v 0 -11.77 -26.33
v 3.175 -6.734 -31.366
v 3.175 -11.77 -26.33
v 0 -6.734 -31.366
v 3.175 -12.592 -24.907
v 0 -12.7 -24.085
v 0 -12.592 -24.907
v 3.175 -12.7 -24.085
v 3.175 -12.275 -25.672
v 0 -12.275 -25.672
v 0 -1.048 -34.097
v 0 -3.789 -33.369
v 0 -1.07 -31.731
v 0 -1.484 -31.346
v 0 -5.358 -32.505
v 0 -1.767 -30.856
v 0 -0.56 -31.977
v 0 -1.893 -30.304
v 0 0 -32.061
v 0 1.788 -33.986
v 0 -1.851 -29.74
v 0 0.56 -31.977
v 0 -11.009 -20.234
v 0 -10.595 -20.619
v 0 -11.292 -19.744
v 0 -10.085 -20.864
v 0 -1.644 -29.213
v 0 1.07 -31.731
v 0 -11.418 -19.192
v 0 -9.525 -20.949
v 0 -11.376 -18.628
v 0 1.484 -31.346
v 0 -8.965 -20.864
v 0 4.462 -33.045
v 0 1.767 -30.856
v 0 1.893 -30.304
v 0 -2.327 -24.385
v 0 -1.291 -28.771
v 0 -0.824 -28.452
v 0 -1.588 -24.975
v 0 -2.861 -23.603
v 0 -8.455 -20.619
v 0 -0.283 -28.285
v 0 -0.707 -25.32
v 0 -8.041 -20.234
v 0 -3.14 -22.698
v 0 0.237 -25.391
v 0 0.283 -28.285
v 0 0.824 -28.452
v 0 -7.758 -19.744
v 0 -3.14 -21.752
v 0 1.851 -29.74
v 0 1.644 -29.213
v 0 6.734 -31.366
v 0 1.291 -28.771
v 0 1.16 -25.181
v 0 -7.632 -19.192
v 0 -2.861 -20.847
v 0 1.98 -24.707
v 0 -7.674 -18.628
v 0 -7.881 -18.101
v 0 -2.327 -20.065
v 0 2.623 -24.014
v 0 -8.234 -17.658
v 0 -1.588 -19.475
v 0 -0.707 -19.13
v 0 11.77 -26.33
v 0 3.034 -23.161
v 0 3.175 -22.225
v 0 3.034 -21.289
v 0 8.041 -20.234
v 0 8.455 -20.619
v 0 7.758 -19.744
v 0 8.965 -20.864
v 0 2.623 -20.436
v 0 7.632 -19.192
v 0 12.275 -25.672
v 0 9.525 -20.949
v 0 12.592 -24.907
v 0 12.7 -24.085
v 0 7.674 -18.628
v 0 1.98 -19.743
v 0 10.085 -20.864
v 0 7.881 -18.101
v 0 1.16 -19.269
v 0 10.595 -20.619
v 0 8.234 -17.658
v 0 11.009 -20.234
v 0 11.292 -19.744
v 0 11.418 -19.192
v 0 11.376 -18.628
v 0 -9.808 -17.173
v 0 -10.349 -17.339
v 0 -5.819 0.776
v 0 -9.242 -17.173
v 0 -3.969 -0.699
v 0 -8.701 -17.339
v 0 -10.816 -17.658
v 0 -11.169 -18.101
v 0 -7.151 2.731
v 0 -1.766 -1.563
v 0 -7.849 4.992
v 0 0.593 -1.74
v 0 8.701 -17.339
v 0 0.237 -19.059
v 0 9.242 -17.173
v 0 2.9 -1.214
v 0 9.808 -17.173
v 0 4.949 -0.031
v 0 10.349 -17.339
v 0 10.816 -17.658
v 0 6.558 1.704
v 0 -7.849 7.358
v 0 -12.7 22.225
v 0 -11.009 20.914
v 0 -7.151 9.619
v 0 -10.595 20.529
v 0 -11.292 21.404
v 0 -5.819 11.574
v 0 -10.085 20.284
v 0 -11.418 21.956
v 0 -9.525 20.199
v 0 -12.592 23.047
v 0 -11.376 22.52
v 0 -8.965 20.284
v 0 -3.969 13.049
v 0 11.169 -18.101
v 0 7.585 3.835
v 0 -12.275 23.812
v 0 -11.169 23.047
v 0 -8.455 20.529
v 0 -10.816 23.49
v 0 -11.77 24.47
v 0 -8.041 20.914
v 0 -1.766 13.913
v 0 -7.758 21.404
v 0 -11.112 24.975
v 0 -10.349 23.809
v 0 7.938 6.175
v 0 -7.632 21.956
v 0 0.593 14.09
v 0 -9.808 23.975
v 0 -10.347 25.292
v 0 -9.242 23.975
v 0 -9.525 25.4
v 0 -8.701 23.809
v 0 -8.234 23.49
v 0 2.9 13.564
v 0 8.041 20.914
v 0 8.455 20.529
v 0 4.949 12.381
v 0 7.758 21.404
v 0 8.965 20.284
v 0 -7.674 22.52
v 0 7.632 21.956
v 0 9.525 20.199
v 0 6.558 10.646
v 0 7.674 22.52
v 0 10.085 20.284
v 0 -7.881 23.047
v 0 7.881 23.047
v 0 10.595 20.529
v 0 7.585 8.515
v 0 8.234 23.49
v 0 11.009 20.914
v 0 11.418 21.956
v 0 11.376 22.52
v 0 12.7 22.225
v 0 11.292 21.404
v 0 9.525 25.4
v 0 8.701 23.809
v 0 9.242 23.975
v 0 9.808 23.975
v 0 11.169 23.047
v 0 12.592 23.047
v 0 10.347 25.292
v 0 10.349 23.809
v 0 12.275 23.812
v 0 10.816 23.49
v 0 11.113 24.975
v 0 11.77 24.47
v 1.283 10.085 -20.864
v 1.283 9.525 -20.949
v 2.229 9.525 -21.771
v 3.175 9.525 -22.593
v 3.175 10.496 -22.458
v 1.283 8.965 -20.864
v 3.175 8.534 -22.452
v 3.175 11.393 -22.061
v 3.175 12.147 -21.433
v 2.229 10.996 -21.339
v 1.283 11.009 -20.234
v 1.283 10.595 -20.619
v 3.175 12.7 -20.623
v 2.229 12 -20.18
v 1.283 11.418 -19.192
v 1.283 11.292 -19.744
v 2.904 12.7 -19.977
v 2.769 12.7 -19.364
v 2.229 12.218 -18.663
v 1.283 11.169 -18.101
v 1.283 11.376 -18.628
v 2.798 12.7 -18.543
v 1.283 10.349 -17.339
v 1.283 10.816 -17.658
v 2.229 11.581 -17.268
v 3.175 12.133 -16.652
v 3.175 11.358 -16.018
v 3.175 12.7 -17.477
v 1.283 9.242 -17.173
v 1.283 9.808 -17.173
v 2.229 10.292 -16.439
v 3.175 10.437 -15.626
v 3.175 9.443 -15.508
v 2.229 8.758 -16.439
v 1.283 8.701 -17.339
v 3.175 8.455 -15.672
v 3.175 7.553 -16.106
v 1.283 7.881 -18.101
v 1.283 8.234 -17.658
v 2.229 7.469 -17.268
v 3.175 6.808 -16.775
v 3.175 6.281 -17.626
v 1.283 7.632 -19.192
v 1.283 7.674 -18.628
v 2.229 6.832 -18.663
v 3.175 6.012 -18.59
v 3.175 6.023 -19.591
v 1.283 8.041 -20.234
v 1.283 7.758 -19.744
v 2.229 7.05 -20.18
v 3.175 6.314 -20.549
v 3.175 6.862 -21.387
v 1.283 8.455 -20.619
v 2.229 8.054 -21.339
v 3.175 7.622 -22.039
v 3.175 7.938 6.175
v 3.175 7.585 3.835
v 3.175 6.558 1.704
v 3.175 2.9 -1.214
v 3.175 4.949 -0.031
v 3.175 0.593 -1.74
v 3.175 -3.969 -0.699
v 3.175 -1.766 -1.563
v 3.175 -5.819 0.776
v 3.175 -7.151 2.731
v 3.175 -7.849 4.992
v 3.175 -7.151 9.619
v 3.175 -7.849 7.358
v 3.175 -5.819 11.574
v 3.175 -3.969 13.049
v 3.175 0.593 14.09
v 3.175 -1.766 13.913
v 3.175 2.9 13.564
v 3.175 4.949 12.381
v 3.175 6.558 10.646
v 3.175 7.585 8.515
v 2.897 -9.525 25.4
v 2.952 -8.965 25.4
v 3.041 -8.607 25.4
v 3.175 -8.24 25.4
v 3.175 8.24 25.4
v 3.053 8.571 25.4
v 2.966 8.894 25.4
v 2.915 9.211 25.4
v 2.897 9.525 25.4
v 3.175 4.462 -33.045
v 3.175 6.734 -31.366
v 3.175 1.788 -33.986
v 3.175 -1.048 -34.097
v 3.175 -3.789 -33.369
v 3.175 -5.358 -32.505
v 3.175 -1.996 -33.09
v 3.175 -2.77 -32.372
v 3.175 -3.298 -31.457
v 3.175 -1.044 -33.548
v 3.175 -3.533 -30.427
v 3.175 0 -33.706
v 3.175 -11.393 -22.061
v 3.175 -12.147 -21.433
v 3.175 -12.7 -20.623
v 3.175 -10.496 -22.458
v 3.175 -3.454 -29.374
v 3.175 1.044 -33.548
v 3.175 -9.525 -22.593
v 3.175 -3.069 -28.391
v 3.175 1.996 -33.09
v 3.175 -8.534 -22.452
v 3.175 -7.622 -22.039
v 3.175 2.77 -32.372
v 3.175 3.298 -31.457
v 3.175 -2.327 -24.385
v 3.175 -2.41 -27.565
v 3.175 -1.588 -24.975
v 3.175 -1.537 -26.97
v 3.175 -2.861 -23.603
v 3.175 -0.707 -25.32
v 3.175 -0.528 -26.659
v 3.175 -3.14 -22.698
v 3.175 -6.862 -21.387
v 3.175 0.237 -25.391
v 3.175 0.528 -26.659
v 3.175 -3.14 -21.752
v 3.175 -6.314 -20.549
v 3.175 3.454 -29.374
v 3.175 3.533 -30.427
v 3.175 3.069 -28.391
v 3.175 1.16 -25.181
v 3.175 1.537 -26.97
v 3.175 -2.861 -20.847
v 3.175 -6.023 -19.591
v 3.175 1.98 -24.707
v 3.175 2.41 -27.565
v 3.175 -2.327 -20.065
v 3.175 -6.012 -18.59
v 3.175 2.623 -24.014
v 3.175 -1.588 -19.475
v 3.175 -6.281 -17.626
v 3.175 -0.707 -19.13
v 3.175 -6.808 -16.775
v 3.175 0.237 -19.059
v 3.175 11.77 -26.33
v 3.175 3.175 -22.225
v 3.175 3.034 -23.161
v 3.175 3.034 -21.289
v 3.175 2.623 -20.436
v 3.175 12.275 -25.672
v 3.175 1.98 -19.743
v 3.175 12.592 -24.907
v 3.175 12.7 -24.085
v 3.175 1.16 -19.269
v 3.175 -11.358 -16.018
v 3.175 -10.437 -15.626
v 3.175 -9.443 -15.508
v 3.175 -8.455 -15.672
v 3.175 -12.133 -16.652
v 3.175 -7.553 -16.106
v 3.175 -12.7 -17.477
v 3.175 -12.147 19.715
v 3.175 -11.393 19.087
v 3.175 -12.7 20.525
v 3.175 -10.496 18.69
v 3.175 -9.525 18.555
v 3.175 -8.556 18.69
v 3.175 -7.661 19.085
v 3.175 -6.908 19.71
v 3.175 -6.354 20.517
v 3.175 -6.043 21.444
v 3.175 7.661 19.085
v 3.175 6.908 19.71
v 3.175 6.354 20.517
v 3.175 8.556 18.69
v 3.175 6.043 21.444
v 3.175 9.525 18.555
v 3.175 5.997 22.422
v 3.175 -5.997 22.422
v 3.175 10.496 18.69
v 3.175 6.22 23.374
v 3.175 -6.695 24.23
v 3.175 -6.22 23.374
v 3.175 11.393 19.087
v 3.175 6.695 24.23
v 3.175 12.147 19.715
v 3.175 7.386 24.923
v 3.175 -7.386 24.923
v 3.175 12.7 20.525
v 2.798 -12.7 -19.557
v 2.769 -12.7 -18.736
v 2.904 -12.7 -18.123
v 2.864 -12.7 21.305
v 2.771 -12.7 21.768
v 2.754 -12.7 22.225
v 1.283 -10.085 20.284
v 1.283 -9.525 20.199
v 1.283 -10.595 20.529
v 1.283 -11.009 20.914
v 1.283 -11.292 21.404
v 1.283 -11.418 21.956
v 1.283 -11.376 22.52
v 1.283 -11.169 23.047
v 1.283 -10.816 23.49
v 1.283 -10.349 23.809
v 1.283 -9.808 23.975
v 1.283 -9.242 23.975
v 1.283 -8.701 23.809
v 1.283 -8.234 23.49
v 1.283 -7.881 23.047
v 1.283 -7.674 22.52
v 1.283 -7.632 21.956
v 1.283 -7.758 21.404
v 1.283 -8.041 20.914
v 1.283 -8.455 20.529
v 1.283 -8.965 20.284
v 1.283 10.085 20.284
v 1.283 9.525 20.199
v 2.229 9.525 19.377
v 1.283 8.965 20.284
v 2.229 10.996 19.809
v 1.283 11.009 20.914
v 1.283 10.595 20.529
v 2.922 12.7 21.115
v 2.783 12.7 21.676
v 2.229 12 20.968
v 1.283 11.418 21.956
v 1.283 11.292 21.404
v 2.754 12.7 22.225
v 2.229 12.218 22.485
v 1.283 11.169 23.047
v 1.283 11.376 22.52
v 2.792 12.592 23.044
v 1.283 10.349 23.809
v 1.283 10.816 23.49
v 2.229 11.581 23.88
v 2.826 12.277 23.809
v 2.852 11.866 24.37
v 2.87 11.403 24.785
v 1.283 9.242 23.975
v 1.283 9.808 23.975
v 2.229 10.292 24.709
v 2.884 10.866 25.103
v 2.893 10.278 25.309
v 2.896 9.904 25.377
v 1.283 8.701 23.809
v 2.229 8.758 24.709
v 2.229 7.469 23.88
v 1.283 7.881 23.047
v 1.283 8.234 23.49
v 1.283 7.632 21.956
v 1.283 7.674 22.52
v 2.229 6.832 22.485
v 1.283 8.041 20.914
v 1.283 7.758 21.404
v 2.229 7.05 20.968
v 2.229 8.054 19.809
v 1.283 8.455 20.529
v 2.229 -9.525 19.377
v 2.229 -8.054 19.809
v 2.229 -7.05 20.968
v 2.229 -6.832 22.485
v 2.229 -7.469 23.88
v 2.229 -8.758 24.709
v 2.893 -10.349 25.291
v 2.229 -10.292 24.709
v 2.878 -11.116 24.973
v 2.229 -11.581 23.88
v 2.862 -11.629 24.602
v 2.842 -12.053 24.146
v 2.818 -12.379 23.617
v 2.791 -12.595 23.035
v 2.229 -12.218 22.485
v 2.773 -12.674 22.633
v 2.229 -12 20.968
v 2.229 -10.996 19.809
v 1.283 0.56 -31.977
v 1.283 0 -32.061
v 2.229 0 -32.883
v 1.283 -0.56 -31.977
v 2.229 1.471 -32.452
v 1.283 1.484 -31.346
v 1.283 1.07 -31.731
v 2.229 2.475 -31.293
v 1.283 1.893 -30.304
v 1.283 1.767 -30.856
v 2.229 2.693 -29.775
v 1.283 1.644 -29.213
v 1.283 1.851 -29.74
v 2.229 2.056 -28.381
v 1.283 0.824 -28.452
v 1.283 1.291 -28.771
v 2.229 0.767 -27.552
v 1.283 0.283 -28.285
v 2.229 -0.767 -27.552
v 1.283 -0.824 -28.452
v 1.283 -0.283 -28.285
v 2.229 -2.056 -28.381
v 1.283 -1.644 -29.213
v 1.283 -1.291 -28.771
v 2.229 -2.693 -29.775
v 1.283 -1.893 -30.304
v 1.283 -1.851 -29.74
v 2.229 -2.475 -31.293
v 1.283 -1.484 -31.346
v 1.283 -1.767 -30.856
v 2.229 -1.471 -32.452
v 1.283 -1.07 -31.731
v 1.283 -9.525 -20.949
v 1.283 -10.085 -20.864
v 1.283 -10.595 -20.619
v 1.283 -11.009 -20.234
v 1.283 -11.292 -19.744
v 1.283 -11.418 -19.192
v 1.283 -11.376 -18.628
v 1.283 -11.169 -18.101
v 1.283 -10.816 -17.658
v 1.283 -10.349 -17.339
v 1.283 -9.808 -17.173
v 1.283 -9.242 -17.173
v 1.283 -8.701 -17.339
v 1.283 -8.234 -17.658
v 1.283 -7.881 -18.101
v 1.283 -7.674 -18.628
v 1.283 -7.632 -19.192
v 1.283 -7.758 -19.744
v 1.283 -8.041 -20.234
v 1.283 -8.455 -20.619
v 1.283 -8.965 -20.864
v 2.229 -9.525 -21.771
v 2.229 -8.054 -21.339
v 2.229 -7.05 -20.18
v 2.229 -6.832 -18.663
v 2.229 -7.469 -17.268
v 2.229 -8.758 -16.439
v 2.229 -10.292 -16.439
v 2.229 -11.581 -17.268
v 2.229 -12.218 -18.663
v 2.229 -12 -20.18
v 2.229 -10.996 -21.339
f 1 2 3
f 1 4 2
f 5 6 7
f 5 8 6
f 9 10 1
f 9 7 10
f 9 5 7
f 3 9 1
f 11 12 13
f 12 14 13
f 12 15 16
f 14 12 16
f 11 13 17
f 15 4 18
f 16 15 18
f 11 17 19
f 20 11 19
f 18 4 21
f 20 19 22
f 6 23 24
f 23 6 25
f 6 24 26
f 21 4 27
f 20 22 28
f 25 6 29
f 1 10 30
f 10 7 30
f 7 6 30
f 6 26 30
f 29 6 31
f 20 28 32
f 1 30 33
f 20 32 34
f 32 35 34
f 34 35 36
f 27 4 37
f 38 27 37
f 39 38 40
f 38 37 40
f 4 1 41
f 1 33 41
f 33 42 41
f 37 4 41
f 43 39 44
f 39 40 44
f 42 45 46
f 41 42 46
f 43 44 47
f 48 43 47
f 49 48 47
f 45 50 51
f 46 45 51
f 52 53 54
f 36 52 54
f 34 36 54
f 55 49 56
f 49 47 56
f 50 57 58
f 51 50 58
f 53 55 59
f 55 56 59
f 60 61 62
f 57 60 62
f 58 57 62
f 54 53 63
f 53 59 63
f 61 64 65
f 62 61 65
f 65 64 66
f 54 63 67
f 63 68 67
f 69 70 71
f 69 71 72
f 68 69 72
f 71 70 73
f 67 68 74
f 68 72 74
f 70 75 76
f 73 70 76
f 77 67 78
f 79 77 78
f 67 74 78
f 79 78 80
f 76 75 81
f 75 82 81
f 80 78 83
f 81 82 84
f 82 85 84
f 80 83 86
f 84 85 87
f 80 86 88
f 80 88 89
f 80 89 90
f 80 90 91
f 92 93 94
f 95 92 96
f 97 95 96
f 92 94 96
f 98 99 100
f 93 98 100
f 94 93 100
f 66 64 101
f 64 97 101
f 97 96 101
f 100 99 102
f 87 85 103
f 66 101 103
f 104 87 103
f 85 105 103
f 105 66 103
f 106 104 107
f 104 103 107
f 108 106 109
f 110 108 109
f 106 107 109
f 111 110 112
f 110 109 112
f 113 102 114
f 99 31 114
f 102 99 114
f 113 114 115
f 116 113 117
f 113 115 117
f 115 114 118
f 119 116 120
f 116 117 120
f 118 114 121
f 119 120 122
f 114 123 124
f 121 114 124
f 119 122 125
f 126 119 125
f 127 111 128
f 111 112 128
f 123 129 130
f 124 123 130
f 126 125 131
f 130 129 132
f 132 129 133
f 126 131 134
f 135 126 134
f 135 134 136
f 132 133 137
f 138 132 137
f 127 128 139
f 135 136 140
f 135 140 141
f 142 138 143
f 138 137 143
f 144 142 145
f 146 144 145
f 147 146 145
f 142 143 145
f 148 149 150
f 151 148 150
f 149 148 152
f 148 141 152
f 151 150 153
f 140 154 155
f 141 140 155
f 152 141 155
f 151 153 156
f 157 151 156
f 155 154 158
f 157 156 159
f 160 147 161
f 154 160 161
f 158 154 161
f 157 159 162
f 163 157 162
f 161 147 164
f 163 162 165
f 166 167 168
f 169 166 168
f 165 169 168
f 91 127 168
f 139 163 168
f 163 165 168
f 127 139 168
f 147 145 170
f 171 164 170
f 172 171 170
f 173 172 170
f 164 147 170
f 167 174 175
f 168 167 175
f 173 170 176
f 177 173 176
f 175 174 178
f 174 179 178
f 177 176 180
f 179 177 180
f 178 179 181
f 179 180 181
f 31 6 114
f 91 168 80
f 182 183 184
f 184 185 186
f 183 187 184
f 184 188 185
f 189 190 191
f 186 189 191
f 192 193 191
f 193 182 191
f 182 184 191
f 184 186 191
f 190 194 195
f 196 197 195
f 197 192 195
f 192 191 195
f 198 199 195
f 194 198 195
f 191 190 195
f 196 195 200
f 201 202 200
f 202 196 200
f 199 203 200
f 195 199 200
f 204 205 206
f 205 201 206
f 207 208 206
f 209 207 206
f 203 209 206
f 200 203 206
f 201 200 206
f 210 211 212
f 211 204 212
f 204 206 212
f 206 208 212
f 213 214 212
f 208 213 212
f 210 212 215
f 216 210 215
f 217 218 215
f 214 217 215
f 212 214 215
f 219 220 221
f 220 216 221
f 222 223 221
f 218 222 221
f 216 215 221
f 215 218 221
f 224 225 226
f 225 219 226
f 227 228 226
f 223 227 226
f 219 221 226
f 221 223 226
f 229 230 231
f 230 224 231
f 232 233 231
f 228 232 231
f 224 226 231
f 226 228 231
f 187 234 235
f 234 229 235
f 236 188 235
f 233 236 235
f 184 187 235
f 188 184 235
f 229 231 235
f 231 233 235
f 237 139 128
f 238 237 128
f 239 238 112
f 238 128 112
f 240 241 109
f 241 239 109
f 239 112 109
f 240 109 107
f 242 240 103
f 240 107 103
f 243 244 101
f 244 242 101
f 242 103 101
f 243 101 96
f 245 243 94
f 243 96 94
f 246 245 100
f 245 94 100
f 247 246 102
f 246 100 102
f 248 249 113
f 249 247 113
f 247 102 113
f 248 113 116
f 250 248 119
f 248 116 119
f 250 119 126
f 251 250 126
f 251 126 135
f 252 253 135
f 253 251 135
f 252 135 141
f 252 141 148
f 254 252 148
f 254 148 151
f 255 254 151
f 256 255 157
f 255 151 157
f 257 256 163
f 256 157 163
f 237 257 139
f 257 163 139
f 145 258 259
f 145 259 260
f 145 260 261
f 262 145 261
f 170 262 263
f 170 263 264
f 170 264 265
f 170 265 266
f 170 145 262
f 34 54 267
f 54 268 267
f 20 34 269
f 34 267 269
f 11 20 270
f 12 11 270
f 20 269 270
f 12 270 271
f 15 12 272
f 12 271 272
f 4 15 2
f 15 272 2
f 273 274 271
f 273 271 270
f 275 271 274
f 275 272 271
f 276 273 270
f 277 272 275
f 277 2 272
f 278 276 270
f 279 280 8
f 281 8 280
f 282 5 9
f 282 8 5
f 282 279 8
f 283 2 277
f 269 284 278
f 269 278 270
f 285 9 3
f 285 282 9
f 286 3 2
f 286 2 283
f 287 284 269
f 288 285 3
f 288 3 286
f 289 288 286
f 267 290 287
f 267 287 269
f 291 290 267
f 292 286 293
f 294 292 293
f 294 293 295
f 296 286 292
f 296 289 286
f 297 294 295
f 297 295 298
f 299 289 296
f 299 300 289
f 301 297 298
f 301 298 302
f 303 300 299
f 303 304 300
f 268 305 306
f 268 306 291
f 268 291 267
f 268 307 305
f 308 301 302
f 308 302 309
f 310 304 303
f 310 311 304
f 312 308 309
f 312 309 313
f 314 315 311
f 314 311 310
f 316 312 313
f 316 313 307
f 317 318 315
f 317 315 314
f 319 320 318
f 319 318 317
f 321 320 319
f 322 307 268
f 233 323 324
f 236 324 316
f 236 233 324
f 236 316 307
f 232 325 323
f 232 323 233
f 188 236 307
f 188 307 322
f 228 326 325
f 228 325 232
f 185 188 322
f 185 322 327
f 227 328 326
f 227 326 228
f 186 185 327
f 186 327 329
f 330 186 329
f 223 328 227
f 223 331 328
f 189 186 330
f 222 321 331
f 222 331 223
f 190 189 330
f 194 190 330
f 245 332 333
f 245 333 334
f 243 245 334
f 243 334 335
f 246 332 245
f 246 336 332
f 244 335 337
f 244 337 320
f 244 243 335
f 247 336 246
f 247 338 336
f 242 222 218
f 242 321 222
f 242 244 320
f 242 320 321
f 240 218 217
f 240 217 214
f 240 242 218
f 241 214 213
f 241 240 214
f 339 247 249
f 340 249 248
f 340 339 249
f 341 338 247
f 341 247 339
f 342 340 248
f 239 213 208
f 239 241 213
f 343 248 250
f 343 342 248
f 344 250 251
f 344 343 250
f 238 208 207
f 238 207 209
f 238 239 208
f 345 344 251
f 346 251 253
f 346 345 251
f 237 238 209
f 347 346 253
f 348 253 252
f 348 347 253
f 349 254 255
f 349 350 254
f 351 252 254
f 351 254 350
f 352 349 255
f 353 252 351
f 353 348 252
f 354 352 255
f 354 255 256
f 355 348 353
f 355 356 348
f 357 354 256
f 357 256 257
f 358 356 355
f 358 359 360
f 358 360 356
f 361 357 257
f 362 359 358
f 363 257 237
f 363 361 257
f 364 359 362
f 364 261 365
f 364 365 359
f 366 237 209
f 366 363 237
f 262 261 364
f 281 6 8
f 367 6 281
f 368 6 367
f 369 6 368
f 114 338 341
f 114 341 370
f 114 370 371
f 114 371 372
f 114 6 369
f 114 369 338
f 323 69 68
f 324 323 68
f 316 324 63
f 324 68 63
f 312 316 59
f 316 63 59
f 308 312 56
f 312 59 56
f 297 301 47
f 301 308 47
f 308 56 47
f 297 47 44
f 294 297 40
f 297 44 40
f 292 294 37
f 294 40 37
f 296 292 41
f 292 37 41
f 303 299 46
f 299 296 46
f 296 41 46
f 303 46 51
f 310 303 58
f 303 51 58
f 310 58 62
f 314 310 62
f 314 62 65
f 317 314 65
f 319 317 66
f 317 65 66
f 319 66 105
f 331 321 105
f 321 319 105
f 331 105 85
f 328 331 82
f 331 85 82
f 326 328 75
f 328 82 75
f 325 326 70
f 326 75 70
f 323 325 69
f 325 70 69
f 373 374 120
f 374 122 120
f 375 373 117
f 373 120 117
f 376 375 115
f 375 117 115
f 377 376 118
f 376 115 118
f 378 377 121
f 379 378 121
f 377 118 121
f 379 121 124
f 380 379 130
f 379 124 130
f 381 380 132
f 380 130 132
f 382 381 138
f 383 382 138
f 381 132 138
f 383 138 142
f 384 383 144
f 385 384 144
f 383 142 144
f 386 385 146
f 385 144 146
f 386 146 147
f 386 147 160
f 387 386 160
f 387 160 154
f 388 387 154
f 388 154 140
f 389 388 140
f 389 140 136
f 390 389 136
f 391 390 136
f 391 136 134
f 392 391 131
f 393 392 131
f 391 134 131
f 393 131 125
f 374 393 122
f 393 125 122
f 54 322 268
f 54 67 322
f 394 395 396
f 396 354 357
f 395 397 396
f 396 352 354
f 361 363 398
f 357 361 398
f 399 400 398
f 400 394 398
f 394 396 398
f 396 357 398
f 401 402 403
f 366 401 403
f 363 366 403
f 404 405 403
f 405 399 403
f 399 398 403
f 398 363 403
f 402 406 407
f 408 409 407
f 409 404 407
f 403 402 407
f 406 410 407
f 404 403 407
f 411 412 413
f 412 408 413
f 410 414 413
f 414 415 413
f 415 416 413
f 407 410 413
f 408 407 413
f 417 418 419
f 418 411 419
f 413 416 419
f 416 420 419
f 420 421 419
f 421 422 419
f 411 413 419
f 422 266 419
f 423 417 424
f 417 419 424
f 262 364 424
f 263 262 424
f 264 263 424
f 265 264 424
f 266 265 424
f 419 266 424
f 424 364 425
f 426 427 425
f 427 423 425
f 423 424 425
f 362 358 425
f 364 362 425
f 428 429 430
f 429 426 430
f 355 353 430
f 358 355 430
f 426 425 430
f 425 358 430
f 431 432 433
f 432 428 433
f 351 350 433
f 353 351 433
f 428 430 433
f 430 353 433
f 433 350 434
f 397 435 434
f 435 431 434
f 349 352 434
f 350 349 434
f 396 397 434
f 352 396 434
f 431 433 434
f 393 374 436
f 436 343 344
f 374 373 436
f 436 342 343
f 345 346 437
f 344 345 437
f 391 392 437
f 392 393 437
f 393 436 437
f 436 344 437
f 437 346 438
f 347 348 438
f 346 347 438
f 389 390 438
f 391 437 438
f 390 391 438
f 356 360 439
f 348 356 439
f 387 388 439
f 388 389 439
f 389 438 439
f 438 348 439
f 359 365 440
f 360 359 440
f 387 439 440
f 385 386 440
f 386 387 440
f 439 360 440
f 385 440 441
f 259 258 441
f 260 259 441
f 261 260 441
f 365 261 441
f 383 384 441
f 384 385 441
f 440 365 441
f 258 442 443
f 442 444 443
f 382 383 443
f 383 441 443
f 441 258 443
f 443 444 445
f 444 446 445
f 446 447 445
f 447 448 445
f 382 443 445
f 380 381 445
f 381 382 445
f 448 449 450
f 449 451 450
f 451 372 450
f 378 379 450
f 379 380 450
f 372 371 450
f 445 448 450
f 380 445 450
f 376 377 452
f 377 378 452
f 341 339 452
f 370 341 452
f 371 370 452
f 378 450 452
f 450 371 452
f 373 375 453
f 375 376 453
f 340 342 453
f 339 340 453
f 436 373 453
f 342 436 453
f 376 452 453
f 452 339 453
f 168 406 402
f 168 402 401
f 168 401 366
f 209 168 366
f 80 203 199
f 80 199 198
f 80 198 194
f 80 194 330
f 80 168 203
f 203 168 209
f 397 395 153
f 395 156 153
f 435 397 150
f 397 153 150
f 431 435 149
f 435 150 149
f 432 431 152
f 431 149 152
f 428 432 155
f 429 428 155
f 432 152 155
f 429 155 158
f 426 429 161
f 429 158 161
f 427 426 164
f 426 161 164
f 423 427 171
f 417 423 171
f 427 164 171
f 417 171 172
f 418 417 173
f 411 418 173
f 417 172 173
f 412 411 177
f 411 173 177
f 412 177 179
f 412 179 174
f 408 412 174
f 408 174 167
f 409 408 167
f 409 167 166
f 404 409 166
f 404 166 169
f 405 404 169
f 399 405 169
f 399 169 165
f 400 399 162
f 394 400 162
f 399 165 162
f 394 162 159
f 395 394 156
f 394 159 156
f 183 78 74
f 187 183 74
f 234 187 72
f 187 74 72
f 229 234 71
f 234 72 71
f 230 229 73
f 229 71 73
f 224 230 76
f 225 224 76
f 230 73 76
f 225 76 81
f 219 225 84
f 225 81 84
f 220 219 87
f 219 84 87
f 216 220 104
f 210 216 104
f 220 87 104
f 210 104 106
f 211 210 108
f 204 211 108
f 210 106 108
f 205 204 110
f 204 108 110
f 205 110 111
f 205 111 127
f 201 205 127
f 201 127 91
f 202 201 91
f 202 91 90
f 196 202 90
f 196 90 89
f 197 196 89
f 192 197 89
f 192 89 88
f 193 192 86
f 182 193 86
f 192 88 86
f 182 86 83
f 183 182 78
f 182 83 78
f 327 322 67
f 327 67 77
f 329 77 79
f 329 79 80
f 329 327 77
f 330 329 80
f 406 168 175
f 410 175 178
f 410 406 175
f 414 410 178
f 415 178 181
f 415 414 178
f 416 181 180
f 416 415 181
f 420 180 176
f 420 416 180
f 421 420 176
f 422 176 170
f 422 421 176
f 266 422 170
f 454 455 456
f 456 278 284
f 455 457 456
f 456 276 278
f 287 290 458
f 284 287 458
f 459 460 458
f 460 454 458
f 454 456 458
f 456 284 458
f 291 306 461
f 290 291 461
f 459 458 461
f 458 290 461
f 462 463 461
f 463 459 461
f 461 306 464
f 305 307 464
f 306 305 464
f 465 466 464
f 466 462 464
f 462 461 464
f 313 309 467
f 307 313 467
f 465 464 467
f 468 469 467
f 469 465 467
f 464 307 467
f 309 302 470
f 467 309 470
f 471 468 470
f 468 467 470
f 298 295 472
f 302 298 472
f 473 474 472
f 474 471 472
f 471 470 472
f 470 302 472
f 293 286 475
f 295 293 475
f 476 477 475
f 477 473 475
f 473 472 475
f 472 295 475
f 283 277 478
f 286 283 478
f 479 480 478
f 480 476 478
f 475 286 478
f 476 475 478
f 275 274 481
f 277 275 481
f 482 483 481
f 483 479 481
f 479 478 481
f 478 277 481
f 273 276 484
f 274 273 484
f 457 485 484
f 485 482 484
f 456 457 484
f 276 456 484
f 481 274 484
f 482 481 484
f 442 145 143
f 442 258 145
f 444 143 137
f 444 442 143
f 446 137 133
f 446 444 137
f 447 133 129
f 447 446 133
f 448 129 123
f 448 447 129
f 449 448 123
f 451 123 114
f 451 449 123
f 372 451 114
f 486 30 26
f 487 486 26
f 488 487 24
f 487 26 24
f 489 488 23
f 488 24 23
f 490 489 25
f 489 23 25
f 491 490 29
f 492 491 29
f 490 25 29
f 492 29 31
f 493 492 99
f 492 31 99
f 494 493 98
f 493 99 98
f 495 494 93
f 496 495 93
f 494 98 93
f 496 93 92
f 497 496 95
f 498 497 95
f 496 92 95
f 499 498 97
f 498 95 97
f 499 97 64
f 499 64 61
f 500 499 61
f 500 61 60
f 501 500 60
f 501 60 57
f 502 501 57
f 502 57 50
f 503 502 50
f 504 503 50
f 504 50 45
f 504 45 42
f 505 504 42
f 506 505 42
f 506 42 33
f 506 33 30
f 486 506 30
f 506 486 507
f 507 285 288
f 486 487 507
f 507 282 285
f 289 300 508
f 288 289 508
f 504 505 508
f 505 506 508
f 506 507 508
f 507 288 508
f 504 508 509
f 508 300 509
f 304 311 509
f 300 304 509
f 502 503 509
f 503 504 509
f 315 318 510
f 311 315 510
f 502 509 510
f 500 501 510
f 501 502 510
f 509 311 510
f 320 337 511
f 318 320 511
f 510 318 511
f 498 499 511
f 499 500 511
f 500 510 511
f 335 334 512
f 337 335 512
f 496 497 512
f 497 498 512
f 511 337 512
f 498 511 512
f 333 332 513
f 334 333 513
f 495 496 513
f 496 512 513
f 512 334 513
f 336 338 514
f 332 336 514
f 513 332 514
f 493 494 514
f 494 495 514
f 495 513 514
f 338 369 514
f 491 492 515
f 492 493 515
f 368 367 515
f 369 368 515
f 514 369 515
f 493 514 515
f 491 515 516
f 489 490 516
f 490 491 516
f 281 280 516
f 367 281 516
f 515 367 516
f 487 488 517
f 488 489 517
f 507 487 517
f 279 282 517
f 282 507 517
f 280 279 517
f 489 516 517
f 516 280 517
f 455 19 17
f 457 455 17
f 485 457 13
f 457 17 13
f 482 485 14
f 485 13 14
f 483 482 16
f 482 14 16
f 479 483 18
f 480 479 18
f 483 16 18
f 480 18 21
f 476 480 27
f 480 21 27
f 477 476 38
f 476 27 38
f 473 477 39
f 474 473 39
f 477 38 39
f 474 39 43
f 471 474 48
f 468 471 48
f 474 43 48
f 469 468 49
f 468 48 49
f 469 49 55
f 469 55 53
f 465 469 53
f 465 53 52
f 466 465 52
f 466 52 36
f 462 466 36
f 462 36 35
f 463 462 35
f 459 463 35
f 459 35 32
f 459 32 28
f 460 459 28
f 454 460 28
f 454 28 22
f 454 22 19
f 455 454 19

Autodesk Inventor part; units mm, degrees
ref_plane "YZ Plane" through (0, 0, 0) normal (1, 0, 0) x (0, 1, 0)
ref_plane "XZ Plane" through (0, 0, 0) normal (0, 1, 0) x (-1, 0, 0)
ref_plane "XY Plane" through (0, 0, 0) normal (0, 0, 1) x (1, 0, 0)
sketch "Sketch1" plane through (0, 0, 0) normal (1, 0, 0) x (0, 1, 0)
  line L0 (-12.7, 25.4) -> (12.7, 25.4)
  line L1 (12.7, 25.4) -> (12.7, -25.4)
  line L2 (12.7, -25.4) -> (-12.7, -25.4) construction
  line L3 (-12.7, -25.4) -> (-12.7, 25.4)
  line L4 (-12.7, 25.4) -> (12.7, -25.4) construction
  line L5 (12.7, 25.4) -> (-12.7, -25.4) construction
  line L6 (0, 25.4) -> (0, -25.4) construction
  circle A0 centre (0, -22.225) radius 3.175
  line L7 (-3.175, -15.875) -> (3.175, -15.875) construction
  line L8 (3.175, -15.875) -> (3.175, -34.925) construction
  line L9 (3.175, -34.925) -> (-3.175, -34.925)
  line L10 (-3.175, -34.925) -> (-3.175, -15.875) construction
  line L11 (-3.175, -15.875) -> (3.175, -34.925) construction
  line L12 (3.175, -15.875) -> (-3.175, -34.925) construction
  line L13 (12.7, -25.4) -> (3.175, -34.925)
  line L14 (-3.175, -34.925) -> (-12.7, -25.4)
  circle A1 centre (0, 6.175) radius 7.9375
  point P0 (0, 0)
  dimension "d0" = 25.4
  dimension "d1" = 50.8
  dimension "d2" = 6.35
  dimension "d4" = 6.35
  dimension "d5" = 9.525
  dimension "d6" = 15.875
  dimension "d7" = 28.4
extrude "Extrusion1" add sketch "Sketch1" along normal blind 3.175
fillet "Fillet1" radius 9.525 2 edges at (1.5875, 3.175, -34.925) (1.5875, -3.175, -34.925)
fillet "Fillet2" radius 3.175 4 edges at (1.5875, 12.7, 25.4) (1.5875, -12.7, 25.4) (1.5875, 12.7, -25.4) (1.5875, -12.7, -25.4)
sketch "Sketch2" plane through (3.175, 0, 0) normal (1, 0, 0) x (0, 0, -1)
  point P0 (19.05, 9.525)
  point P1 (30.1625, 0)
  point P2 (19.05, -9.525)
  point P3 (-22.098, 9.525)
  point P4 (-22.098, -9.525)
hole "Hole1" at (3.175, 9.525, -19.05) at (3.175, 0, -30.1625) at (3.175, -9.525, -19.05) at (3.175, 9.525, 22.098) at (3.175, -9.525, 22.098) direction (-1, 0, 0) diameter 3.7973 end through all countersink diameter 7.0866 countersink angle 82
properties part number "Face PLate" material "UHMW, White"
